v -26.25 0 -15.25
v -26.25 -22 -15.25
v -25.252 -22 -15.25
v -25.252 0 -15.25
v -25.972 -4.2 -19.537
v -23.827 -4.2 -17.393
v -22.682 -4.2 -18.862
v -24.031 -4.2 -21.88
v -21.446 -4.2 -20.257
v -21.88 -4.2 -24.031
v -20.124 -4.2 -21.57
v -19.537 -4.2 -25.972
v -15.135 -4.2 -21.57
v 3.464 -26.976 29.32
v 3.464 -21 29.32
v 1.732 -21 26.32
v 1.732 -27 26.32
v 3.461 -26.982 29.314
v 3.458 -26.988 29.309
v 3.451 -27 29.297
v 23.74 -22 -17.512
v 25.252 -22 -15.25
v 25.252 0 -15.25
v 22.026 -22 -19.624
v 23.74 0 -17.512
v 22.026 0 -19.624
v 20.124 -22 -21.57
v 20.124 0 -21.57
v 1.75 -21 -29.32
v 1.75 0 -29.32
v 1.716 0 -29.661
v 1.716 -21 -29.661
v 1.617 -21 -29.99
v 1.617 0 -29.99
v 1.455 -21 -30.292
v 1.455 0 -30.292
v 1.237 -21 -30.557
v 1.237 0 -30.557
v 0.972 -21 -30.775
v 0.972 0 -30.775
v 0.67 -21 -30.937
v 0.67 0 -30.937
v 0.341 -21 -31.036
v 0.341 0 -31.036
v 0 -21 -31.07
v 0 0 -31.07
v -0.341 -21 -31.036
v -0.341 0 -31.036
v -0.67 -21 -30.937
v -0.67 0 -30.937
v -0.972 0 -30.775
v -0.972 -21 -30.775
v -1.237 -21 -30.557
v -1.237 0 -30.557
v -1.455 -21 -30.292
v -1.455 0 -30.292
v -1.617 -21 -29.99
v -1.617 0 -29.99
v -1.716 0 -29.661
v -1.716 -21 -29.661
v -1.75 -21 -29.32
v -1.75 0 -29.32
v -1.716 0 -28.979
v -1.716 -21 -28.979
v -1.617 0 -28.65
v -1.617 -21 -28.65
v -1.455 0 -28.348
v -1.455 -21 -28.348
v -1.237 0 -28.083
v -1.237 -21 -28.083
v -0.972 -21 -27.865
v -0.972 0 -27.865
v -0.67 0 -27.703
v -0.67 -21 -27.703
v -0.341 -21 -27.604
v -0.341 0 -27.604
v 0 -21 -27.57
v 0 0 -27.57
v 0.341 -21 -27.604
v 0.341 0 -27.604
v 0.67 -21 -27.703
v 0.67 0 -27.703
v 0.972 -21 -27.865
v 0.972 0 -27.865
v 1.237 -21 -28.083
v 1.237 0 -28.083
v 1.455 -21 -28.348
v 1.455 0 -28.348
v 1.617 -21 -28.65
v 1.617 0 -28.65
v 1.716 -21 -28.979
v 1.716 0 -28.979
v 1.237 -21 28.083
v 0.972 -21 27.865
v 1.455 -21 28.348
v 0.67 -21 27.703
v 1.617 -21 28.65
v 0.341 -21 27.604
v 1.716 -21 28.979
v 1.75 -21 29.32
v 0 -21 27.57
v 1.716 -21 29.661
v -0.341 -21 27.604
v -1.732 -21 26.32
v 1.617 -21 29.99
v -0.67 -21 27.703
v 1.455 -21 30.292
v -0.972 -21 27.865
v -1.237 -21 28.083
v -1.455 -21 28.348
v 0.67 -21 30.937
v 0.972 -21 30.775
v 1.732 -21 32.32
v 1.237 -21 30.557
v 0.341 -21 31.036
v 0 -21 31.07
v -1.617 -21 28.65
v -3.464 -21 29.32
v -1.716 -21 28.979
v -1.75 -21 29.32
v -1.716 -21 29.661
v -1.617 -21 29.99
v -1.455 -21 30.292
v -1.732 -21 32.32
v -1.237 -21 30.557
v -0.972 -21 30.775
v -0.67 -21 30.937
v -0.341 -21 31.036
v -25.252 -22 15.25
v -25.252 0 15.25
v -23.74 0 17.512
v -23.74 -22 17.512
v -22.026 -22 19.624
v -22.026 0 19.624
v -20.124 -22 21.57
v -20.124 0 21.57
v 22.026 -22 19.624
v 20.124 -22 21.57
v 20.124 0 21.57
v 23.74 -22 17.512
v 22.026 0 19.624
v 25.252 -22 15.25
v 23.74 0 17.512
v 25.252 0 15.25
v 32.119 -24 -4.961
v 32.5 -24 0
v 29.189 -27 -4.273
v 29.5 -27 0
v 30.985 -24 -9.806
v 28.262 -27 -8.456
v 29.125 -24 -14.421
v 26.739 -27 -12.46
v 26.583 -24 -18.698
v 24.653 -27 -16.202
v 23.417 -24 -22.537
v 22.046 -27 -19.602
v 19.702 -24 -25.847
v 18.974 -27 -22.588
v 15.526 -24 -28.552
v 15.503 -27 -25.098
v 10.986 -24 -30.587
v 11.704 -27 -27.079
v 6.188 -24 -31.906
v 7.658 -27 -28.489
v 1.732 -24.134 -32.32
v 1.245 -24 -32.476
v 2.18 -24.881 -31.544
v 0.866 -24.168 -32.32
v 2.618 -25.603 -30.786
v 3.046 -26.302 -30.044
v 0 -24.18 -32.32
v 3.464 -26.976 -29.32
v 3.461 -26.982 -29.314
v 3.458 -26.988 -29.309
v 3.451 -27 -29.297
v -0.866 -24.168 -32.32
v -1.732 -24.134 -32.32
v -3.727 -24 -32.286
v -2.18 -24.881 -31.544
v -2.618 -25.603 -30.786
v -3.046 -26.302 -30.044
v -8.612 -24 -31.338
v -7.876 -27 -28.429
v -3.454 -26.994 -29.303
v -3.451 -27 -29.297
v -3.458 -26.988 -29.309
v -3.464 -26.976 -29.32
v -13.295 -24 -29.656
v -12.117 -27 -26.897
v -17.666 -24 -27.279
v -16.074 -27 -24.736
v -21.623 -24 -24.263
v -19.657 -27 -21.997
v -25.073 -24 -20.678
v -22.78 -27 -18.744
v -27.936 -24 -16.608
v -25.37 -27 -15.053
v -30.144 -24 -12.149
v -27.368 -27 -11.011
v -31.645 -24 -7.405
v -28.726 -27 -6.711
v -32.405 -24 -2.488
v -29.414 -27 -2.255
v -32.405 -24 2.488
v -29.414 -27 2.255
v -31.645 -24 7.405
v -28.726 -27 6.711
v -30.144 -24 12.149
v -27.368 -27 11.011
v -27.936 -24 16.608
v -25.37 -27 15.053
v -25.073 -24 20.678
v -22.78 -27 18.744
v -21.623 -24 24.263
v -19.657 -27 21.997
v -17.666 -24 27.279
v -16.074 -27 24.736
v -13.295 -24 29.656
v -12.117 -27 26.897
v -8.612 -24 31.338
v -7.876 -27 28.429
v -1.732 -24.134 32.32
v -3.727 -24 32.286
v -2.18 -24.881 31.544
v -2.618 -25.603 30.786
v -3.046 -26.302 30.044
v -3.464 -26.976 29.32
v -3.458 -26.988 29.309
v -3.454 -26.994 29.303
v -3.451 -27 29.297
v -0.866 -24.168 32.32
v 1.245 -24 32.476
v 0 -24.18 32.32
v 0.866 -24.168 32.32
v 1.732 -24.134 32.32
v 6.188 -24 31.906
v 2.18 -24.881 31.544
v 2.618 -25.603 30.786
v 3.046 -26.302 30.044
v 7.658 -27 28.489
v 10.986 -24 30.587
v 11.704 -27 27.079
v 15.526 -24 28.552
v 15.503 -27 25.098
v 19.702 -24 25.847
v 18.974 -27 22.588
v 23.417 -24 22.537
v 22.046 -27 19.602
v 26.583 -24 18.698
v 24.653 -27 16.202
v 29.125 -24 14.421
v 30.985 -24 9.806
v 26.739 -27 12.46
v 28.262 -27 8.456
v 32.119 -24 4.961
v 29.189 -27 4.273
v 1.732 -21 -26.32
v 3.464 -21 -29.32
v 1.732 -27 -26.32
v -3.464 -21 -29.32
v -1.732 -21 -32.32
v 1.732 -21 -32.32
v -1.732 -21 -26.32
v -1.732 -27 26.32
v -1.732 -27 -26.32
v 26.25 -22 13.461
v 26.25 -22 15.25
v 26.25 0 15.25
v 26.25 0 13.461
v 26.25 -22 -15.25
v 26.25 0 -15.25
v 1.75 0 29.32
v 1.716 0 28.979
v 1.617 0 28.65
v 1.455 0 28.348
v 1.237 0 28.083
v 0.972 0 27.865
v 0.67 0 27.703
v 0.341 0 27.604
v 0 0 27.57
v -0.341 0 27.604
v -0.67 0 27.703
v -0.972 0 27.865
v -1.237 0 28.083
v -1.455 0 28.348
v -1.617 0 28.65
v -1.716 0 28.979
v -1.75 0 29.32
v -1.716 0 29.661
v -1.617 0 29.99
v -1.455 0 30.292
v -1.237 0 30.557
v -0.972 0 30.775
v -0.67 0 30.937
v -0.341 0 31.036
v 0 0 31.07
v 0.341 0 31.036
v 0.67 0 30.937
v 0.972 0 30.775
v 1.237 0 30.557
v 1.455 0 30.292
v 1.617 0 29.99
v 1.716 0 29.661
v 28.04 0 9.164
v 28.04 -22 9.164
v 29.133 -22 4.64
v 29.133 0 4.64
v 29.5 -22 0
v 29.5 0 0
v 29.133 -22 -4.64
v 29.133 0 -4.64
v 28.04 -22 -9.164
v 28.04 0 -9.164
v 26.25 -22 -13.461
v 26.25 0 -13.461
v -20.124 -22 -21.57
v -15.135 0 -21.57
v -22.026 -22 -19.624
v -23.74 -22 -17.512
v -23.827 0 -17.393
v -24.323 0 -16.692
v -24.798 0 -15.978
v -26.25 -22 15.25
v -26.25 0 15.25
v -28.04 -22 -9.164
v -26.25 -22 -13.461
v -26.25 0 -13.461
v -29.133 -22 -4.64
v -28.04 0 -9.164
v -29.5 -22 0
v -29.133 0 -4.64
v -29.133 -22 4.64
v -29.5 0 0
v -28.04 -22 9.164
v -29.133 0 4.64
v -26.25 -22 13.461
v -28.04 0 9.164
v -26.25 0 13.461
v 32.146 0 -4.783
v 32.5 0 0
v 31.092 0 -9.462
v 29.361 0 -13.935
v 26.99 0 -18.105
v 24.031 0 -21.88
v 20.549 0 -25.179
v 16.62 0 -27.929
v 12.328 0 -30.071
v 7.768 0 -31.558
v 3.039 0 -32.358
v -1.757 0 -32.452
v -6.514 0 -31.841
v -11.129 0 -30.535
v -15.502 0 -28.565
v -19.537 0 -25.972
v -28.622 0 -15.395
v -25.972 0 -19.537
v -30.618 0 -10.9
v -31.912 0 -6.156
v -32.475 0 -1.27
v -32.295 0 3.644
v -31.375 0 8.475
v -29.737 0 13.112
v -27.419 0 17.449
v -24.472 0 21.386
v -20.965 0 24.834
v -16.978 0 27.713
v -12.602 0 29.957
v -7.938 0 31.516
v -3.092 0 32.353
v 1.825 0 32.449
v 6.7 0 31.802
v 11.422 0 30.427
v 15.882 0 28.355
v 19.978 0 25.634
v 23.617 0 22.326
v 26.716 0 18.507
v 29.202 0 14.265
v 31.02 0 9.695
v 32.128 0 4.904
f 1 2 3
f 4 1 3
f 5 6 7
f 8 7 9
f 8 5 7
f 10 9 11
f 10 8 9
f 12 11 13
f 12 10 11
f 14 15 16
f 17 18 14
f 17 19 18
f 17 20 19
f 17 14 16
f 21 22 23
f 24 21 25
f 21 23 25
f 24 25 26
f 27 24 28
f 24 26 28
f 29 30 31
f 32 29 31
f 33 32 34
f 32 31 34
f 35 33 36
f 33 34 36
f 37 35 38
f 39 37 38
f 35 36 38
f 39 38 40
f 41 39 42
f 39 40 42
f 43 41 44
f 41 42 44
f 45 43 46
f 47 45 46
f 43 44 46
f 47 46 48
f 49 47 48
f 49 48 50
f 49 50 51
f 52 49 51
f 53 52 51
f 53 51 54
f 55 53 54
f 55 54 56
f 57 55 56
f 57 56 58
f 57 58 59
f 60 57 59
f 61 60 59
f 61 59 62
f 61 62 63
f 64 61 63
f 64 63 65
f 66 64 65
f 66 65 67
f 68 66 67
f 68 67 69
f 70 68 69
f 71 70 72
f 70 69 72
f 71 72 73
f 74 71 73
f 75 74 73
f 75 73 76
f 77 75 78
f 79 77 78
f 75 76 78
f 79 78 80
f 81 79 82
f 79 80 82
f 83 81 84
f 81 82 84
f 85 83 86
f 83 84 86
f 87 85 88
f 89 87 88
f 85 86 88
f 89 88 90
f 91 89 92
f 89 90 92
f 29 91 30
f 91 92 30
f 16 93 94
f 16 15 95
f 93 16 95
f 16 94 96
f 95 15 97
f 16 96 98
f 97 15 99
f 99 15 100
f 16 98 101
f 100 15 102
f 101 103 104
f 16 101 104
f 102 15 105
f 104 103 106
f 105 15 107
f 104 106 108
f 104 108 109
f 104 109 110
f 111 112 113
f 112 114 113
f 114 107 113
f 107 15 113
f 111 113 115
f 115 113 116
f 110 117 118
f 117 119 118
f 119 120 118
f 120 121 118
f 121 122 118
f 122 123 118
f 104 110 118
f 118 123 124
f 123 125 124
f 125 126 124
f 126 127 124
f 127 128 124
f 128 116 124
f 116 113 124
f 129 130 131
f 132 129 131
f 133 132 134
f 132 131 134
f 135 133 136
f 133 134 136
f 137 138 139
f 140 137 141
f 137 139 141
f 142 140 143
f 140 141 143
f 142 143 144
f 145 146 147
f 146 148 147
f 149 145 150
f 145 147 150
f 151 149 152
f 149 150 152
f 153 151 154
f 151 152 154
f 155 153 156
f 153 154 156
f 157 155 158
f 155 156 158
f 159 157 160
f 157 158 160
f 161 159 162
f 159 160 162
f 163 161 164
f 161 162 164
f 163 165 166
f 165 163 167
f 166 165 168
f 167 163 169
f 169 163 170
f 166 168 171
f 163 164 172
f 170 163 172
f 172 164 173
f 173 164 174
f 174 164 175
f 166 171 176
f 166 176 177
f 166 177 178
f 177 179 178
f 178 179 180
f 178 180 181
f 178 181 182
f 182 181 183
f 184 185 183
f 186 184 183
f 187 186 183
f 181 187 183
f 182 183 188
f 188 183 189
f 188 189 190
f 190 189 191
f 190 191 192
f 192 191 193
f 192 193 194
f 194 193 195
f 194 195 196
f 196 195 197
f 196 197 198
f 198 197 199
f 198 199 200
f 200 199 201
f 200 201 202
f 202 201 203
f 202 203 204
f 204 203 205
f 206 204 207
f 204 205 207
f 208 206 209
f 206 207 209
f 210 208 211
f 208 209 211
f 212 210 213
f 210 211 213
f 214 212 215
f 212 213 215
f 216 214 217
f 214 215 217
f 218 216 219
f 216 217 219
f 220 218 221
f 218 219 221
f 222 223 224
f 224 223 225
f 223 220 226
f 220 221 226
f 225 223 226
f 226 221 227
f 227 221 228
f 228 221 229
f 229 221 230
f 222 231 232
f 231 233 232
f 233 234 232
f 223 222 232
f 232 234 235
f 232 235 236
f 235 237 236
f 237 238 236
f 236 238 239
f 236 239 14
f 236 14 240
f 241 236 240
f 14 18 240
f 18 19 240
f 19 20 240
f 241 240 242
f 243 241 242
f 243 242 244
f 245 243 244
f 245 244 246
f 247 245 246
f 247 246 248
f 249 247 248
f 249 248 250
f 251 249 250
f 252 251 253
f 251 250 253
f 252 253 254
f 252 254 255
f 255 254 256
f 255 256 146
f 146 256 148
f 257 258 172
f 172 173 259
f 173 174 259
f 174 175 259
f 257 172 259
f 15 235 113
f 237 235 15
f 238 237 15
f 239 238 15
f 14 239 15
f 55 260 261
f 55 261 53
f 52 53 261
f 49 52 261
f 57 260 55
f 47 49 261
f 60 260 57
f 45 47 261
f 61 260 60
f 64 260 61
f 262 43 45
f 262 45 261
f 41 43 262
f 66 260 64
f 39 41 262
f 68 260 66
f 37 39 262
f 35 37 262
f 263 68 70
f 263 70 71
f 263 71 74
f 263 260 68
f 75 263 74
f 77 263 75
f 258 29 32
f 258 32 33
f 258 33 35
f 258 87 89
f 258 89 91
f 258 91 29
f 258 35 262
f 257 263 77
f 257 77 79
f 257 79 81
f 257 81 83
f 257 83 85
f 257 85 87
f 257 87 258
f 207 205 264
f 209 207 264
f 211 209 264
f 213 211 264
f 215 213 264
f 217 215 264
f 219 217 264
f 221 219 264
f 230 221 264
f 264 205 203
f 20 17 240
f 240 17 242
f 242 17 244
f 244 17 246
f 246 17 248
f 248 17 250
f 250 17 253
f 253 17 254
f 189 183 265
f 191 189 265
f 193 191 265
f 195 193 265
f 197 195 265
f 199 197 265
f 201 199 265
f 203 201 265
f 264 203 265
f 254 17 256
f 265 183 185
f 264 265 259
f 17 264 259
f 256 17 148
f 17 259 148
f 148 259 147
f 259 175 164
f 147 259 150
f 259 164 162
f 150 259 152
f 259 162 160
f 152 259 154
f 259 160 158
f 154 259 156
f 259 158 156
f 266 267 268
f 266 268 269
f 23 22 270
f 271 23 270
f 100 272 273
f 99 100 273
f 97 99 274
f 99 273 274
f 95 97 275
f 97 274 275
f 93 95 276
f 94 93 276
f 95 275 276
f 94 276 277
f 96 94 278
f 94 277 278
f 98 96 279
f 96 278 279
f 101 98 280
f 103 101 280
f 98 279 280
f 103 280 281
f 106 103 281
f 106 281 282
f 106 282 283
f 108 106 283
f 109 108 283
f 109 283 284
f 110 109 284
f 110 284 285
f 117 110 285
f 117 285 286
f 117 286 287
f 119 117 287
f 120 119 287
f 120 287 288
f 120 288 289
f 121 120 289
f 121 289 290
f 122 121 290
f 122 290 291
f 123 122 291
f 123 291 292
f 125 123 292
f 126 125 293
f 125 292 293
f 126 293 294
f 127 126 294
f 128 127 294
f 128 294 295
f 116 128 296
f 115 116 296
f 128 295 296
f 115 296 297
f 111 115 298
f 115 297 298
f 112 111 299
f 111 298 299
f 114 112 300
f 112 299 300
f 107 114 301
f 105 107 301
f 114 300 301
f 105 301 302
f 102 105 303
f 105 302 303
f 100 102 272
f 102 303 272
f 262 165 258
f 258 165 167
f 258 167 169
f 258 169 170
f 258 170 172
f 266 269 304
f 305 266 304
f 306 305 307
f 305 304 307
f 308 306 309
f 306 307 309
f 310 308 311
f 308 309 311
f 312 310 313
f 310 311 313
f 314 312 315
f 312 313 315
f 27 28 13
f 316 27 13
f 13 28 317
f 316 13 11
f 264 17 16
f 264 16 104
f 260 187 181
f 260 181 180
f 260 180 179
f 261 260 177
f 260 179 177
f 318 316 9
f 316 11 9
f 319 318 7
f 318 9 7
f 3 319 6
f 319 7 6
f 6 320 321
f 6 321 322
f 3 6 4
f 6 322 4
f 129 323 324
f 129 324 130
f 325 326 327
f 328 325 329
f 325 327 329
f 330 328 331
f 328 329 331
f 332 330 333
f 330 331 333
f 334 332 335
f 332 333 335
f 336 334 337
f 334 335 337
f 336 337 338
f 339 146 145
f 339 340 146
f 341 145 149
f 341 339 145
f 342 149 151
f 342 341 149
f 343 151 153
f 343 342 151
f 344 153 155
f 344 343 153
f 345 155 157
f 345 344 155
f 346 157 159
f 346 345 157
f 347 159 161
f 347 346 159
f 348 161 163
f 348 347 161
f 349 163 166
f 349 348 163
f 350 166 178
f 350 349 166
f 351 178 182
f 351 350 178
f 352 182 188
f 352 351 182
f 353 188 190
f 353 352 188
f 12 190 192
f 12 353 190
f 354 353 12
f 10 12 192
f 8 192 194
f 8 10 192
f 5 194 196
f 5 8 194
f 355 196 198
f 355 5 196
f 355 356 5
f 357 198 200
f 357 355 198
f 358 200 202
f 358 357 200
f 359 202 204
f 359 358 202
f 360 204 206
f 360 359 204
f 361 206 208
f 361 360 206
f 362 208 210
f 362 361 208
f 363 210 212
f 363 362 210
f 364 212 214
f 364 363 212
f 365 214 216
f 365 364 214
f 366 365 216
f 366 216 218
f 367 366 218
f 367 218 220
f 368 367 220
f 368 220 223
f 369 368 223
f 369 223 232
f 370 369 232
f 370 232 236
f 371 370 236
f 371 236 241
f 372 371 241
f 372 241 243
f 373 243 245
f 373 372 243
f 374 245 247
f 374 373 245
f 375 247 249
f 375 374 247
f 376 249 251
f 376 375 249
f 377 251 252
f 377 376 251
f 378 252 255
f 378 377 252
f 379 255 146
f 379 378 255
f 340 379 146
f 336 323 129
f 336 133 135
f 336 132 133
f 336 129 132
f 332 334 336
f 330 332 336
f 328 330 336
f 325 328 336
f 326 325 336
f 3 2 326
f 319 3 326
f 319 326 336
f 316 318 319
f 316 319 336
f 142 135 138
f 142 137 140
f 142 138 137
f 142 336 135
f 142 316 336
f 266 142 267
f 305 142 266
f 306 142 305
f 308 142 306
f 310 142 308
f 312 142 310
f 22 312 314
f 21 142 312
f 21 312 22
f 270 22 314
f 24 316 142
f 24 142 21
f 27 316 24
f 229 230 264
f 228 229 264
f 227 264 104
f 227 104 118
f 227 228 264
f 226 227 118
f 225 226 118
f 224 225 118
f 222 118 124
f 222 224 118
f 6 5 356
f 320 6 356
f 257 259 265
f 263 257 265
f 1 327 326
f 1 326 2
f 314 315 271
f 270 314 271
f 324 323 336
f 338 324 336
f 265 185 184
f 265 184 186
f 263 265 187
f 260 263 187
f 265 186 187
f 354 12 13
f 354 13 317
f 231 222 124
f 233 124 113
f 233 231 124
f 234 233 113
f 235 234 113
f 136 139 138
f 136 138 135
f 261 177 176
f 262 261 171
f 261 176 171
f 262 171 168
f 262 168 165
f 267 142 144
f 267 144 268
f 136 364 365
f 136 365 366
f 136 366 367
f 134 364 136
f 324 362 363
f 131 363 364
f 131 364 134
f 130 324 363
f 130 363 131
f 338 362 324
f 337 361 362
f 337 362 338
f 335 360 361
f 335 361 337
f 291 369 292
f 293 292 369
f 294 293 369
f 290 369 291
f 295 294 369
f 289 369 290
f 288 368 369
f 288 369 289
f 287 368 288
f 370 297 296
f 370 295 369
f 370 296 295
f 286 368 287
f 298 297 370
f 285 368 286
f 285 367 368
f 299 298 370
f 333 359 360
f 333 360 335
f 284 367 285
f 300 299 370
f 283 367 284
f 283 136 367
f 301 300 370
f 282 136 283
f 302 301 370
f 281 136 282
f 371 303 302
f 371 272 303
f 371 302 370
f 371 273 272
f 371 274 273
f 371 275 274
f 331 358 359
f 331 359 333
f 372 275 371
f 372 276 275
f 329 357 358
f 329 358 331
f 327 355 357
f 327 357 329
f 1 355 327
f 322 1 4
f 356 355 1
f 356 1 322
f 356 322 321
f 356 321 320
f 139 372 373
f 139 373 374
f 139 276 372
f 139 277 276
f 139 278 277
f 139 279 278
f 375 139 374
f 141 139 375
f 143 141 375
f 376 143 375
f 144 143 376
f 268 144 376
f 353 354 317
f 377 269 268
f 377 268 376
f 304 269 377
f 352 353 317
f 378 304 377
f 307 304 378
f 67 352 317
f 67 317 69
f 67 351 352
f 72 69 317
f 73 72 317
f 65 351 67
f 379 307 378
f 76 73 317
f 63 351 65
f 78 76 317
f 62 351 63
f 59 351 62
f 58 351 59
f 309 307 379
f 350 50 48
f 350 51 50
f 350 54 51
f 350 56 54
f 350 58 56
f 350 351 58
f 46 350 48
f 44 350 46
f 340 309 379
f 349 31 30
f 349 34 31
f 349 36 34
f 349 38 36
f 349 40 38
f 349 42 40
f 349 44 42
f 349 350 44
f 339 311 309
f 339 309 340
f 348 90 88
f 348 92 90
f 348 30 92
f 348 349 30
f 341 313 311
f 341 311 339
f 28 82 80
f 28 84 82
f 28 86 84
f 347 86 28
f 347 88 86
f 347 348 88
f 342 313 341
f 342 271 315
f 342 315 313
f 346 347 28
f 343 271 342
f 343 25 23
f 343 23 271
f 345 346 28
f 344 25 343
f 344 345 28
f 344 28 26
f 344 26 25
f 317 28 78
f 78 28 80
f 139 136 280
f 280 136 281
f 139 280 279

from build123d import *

# Parameters (mm, degrees)
SKETCH2_R           = 32.5
BOSS_EXTRUDE1_DEPTH = 27
SKETCH3_R           = 29.5
CUT_EXTRUDE1_DEPTH  = 22
CHAMFER1_SIZE       = 3
BOSS_EXTRUDE2_DEPTH = 22
SKETCH6_W           = 52.5
SKETCH6_H           = 30.5
CUT_EXTRUDE3_DEPTH  = 23
CUT_EXTRUDE4_DEPTH  = 6
SKETCH12_W          = 4.2
SKETCH12_H          = 9.1
CUT_EXTRUDE5_DEPTH  = 10
SKETCH4_R           = 1.75
CUT_EXTRUDE2_DEPTH  = 28


with BuildPart() as part:
    # Sketch2 → Boss-Extrude1 (new body)
    with BuildSketch(Plane(origin=(0, 0, 0), x_dir=(1, 0, 0), z_dir=(0, 1, 0))):
        Circle(SKETCH2_R)
    extrude(amount=-BOSS_EXTRUDE1_DEPTH)

    # Sketch3 → Cut-Extrude1 (cut)
    with BuildSketch(Plane(origin=(0, 0, 0), x_dir=(1, 0, 0), z_dir=(0, 1, 0))):
        Circle(SKETCH3_R)
    extrude(amount=-CUT_EXTRUDE1_DEPTH, mode=Mode.SUBTRACT)

    # Chamfer1
    chamfer1_edges = [part.edges().sort_by_distance(p)[0] for p in [
        (-32.5, -27, 0),
    ]]
    chamfer(chamfer1_edges, length=CHAMFER1_SIZE)

    # Sketch5 → Boss-Extrude2 (add)
    with BuildSketch(Plane(origin=(0, 0, 0), x_dir=(1, 0, 0), z_dir=(0, 1, 0))):
        with BuildLine():
            Line((20.124241601, -21.57), (-20.124241601, -21.57))
            ThreePointArc((-20.124241601, -21.57), (0, -29.5), (20.124241601, -21.57))
        make_face()
    boss_extrude2 = extrude(amount=-BOSS_EXTRUDE2_DEPTH)

    # Sketch6 → Cut-Extrude3 (cut, through all)
    with BuildSketch(Plane(origin=(0, -22, 0), x_dir=(1, 0, 0), z_dir=(0, 1, 0))):
        Rectangle(SKETCH6_W, SKETCH6_H)
    extrude(amount=CUT_EXTRUDE3_DEPTH, mode=Mode.SUBTRACT)

    # Mirror1: Boss-Extrude2 across plane
    add(boss_extrude2.mirror(Plane.XY))

    # Sketch10 → Cut-Extrude4 (cut)
    with BuildSketch(Plane.XZ.offset(27)):
        Polygon((-1.732050808, -32.32), (1.732050808, -32.32), (3.464101615, -29.32), (1.732050808, -26.32), (-1.732050808, -26.32), (-3.464101615, -29.32), align=None)
        Polygon((-3.464101615, 29.32), (-1.732050808, 32.32), (1.732050808, 32.32), (3.464101615, 29.32), (1.732050808, 26.32), (-1.732050808, 26.32), align=None)
    extrude(amount=-CUT_EXTRUDE4_DEPTH, mode=Mode.SUBTRACT)

    # Sketch12 → Cut-Extrude5 (cut)
    with BuildSketch(Plane(origin=(-22.980970389, 0, -22.980970389), x_dir=(0, 1, 0), z_dir=(-0.707106781, 0, -0.707106781))):
        with Locations((-2.1, 0)):
            Rectangle(SKETCH12_W, SKETCH12_H)
    extrude(amount=-CUT_EXTRUDE5_DEPTH, mode=Mode.SUBTRACT)

    # Sketch4 → Cut-Extrude2 (cut, through all)
    with BuildSketch(Plane(origin=(0, 0, 0), x_dir=(1, 0, 0), z_dir=(0, 1, 0))):
        with Locations((0, 29.32)):
            Circle(SKETCH4_R)
        with Locations((0, -29.32)):
            Circle(SKETCH4_R)
    extrude(amount=-CUT_EXTRUDE2_DEPTH, mode=Mode.SUBTRACT)


solid = part.part
